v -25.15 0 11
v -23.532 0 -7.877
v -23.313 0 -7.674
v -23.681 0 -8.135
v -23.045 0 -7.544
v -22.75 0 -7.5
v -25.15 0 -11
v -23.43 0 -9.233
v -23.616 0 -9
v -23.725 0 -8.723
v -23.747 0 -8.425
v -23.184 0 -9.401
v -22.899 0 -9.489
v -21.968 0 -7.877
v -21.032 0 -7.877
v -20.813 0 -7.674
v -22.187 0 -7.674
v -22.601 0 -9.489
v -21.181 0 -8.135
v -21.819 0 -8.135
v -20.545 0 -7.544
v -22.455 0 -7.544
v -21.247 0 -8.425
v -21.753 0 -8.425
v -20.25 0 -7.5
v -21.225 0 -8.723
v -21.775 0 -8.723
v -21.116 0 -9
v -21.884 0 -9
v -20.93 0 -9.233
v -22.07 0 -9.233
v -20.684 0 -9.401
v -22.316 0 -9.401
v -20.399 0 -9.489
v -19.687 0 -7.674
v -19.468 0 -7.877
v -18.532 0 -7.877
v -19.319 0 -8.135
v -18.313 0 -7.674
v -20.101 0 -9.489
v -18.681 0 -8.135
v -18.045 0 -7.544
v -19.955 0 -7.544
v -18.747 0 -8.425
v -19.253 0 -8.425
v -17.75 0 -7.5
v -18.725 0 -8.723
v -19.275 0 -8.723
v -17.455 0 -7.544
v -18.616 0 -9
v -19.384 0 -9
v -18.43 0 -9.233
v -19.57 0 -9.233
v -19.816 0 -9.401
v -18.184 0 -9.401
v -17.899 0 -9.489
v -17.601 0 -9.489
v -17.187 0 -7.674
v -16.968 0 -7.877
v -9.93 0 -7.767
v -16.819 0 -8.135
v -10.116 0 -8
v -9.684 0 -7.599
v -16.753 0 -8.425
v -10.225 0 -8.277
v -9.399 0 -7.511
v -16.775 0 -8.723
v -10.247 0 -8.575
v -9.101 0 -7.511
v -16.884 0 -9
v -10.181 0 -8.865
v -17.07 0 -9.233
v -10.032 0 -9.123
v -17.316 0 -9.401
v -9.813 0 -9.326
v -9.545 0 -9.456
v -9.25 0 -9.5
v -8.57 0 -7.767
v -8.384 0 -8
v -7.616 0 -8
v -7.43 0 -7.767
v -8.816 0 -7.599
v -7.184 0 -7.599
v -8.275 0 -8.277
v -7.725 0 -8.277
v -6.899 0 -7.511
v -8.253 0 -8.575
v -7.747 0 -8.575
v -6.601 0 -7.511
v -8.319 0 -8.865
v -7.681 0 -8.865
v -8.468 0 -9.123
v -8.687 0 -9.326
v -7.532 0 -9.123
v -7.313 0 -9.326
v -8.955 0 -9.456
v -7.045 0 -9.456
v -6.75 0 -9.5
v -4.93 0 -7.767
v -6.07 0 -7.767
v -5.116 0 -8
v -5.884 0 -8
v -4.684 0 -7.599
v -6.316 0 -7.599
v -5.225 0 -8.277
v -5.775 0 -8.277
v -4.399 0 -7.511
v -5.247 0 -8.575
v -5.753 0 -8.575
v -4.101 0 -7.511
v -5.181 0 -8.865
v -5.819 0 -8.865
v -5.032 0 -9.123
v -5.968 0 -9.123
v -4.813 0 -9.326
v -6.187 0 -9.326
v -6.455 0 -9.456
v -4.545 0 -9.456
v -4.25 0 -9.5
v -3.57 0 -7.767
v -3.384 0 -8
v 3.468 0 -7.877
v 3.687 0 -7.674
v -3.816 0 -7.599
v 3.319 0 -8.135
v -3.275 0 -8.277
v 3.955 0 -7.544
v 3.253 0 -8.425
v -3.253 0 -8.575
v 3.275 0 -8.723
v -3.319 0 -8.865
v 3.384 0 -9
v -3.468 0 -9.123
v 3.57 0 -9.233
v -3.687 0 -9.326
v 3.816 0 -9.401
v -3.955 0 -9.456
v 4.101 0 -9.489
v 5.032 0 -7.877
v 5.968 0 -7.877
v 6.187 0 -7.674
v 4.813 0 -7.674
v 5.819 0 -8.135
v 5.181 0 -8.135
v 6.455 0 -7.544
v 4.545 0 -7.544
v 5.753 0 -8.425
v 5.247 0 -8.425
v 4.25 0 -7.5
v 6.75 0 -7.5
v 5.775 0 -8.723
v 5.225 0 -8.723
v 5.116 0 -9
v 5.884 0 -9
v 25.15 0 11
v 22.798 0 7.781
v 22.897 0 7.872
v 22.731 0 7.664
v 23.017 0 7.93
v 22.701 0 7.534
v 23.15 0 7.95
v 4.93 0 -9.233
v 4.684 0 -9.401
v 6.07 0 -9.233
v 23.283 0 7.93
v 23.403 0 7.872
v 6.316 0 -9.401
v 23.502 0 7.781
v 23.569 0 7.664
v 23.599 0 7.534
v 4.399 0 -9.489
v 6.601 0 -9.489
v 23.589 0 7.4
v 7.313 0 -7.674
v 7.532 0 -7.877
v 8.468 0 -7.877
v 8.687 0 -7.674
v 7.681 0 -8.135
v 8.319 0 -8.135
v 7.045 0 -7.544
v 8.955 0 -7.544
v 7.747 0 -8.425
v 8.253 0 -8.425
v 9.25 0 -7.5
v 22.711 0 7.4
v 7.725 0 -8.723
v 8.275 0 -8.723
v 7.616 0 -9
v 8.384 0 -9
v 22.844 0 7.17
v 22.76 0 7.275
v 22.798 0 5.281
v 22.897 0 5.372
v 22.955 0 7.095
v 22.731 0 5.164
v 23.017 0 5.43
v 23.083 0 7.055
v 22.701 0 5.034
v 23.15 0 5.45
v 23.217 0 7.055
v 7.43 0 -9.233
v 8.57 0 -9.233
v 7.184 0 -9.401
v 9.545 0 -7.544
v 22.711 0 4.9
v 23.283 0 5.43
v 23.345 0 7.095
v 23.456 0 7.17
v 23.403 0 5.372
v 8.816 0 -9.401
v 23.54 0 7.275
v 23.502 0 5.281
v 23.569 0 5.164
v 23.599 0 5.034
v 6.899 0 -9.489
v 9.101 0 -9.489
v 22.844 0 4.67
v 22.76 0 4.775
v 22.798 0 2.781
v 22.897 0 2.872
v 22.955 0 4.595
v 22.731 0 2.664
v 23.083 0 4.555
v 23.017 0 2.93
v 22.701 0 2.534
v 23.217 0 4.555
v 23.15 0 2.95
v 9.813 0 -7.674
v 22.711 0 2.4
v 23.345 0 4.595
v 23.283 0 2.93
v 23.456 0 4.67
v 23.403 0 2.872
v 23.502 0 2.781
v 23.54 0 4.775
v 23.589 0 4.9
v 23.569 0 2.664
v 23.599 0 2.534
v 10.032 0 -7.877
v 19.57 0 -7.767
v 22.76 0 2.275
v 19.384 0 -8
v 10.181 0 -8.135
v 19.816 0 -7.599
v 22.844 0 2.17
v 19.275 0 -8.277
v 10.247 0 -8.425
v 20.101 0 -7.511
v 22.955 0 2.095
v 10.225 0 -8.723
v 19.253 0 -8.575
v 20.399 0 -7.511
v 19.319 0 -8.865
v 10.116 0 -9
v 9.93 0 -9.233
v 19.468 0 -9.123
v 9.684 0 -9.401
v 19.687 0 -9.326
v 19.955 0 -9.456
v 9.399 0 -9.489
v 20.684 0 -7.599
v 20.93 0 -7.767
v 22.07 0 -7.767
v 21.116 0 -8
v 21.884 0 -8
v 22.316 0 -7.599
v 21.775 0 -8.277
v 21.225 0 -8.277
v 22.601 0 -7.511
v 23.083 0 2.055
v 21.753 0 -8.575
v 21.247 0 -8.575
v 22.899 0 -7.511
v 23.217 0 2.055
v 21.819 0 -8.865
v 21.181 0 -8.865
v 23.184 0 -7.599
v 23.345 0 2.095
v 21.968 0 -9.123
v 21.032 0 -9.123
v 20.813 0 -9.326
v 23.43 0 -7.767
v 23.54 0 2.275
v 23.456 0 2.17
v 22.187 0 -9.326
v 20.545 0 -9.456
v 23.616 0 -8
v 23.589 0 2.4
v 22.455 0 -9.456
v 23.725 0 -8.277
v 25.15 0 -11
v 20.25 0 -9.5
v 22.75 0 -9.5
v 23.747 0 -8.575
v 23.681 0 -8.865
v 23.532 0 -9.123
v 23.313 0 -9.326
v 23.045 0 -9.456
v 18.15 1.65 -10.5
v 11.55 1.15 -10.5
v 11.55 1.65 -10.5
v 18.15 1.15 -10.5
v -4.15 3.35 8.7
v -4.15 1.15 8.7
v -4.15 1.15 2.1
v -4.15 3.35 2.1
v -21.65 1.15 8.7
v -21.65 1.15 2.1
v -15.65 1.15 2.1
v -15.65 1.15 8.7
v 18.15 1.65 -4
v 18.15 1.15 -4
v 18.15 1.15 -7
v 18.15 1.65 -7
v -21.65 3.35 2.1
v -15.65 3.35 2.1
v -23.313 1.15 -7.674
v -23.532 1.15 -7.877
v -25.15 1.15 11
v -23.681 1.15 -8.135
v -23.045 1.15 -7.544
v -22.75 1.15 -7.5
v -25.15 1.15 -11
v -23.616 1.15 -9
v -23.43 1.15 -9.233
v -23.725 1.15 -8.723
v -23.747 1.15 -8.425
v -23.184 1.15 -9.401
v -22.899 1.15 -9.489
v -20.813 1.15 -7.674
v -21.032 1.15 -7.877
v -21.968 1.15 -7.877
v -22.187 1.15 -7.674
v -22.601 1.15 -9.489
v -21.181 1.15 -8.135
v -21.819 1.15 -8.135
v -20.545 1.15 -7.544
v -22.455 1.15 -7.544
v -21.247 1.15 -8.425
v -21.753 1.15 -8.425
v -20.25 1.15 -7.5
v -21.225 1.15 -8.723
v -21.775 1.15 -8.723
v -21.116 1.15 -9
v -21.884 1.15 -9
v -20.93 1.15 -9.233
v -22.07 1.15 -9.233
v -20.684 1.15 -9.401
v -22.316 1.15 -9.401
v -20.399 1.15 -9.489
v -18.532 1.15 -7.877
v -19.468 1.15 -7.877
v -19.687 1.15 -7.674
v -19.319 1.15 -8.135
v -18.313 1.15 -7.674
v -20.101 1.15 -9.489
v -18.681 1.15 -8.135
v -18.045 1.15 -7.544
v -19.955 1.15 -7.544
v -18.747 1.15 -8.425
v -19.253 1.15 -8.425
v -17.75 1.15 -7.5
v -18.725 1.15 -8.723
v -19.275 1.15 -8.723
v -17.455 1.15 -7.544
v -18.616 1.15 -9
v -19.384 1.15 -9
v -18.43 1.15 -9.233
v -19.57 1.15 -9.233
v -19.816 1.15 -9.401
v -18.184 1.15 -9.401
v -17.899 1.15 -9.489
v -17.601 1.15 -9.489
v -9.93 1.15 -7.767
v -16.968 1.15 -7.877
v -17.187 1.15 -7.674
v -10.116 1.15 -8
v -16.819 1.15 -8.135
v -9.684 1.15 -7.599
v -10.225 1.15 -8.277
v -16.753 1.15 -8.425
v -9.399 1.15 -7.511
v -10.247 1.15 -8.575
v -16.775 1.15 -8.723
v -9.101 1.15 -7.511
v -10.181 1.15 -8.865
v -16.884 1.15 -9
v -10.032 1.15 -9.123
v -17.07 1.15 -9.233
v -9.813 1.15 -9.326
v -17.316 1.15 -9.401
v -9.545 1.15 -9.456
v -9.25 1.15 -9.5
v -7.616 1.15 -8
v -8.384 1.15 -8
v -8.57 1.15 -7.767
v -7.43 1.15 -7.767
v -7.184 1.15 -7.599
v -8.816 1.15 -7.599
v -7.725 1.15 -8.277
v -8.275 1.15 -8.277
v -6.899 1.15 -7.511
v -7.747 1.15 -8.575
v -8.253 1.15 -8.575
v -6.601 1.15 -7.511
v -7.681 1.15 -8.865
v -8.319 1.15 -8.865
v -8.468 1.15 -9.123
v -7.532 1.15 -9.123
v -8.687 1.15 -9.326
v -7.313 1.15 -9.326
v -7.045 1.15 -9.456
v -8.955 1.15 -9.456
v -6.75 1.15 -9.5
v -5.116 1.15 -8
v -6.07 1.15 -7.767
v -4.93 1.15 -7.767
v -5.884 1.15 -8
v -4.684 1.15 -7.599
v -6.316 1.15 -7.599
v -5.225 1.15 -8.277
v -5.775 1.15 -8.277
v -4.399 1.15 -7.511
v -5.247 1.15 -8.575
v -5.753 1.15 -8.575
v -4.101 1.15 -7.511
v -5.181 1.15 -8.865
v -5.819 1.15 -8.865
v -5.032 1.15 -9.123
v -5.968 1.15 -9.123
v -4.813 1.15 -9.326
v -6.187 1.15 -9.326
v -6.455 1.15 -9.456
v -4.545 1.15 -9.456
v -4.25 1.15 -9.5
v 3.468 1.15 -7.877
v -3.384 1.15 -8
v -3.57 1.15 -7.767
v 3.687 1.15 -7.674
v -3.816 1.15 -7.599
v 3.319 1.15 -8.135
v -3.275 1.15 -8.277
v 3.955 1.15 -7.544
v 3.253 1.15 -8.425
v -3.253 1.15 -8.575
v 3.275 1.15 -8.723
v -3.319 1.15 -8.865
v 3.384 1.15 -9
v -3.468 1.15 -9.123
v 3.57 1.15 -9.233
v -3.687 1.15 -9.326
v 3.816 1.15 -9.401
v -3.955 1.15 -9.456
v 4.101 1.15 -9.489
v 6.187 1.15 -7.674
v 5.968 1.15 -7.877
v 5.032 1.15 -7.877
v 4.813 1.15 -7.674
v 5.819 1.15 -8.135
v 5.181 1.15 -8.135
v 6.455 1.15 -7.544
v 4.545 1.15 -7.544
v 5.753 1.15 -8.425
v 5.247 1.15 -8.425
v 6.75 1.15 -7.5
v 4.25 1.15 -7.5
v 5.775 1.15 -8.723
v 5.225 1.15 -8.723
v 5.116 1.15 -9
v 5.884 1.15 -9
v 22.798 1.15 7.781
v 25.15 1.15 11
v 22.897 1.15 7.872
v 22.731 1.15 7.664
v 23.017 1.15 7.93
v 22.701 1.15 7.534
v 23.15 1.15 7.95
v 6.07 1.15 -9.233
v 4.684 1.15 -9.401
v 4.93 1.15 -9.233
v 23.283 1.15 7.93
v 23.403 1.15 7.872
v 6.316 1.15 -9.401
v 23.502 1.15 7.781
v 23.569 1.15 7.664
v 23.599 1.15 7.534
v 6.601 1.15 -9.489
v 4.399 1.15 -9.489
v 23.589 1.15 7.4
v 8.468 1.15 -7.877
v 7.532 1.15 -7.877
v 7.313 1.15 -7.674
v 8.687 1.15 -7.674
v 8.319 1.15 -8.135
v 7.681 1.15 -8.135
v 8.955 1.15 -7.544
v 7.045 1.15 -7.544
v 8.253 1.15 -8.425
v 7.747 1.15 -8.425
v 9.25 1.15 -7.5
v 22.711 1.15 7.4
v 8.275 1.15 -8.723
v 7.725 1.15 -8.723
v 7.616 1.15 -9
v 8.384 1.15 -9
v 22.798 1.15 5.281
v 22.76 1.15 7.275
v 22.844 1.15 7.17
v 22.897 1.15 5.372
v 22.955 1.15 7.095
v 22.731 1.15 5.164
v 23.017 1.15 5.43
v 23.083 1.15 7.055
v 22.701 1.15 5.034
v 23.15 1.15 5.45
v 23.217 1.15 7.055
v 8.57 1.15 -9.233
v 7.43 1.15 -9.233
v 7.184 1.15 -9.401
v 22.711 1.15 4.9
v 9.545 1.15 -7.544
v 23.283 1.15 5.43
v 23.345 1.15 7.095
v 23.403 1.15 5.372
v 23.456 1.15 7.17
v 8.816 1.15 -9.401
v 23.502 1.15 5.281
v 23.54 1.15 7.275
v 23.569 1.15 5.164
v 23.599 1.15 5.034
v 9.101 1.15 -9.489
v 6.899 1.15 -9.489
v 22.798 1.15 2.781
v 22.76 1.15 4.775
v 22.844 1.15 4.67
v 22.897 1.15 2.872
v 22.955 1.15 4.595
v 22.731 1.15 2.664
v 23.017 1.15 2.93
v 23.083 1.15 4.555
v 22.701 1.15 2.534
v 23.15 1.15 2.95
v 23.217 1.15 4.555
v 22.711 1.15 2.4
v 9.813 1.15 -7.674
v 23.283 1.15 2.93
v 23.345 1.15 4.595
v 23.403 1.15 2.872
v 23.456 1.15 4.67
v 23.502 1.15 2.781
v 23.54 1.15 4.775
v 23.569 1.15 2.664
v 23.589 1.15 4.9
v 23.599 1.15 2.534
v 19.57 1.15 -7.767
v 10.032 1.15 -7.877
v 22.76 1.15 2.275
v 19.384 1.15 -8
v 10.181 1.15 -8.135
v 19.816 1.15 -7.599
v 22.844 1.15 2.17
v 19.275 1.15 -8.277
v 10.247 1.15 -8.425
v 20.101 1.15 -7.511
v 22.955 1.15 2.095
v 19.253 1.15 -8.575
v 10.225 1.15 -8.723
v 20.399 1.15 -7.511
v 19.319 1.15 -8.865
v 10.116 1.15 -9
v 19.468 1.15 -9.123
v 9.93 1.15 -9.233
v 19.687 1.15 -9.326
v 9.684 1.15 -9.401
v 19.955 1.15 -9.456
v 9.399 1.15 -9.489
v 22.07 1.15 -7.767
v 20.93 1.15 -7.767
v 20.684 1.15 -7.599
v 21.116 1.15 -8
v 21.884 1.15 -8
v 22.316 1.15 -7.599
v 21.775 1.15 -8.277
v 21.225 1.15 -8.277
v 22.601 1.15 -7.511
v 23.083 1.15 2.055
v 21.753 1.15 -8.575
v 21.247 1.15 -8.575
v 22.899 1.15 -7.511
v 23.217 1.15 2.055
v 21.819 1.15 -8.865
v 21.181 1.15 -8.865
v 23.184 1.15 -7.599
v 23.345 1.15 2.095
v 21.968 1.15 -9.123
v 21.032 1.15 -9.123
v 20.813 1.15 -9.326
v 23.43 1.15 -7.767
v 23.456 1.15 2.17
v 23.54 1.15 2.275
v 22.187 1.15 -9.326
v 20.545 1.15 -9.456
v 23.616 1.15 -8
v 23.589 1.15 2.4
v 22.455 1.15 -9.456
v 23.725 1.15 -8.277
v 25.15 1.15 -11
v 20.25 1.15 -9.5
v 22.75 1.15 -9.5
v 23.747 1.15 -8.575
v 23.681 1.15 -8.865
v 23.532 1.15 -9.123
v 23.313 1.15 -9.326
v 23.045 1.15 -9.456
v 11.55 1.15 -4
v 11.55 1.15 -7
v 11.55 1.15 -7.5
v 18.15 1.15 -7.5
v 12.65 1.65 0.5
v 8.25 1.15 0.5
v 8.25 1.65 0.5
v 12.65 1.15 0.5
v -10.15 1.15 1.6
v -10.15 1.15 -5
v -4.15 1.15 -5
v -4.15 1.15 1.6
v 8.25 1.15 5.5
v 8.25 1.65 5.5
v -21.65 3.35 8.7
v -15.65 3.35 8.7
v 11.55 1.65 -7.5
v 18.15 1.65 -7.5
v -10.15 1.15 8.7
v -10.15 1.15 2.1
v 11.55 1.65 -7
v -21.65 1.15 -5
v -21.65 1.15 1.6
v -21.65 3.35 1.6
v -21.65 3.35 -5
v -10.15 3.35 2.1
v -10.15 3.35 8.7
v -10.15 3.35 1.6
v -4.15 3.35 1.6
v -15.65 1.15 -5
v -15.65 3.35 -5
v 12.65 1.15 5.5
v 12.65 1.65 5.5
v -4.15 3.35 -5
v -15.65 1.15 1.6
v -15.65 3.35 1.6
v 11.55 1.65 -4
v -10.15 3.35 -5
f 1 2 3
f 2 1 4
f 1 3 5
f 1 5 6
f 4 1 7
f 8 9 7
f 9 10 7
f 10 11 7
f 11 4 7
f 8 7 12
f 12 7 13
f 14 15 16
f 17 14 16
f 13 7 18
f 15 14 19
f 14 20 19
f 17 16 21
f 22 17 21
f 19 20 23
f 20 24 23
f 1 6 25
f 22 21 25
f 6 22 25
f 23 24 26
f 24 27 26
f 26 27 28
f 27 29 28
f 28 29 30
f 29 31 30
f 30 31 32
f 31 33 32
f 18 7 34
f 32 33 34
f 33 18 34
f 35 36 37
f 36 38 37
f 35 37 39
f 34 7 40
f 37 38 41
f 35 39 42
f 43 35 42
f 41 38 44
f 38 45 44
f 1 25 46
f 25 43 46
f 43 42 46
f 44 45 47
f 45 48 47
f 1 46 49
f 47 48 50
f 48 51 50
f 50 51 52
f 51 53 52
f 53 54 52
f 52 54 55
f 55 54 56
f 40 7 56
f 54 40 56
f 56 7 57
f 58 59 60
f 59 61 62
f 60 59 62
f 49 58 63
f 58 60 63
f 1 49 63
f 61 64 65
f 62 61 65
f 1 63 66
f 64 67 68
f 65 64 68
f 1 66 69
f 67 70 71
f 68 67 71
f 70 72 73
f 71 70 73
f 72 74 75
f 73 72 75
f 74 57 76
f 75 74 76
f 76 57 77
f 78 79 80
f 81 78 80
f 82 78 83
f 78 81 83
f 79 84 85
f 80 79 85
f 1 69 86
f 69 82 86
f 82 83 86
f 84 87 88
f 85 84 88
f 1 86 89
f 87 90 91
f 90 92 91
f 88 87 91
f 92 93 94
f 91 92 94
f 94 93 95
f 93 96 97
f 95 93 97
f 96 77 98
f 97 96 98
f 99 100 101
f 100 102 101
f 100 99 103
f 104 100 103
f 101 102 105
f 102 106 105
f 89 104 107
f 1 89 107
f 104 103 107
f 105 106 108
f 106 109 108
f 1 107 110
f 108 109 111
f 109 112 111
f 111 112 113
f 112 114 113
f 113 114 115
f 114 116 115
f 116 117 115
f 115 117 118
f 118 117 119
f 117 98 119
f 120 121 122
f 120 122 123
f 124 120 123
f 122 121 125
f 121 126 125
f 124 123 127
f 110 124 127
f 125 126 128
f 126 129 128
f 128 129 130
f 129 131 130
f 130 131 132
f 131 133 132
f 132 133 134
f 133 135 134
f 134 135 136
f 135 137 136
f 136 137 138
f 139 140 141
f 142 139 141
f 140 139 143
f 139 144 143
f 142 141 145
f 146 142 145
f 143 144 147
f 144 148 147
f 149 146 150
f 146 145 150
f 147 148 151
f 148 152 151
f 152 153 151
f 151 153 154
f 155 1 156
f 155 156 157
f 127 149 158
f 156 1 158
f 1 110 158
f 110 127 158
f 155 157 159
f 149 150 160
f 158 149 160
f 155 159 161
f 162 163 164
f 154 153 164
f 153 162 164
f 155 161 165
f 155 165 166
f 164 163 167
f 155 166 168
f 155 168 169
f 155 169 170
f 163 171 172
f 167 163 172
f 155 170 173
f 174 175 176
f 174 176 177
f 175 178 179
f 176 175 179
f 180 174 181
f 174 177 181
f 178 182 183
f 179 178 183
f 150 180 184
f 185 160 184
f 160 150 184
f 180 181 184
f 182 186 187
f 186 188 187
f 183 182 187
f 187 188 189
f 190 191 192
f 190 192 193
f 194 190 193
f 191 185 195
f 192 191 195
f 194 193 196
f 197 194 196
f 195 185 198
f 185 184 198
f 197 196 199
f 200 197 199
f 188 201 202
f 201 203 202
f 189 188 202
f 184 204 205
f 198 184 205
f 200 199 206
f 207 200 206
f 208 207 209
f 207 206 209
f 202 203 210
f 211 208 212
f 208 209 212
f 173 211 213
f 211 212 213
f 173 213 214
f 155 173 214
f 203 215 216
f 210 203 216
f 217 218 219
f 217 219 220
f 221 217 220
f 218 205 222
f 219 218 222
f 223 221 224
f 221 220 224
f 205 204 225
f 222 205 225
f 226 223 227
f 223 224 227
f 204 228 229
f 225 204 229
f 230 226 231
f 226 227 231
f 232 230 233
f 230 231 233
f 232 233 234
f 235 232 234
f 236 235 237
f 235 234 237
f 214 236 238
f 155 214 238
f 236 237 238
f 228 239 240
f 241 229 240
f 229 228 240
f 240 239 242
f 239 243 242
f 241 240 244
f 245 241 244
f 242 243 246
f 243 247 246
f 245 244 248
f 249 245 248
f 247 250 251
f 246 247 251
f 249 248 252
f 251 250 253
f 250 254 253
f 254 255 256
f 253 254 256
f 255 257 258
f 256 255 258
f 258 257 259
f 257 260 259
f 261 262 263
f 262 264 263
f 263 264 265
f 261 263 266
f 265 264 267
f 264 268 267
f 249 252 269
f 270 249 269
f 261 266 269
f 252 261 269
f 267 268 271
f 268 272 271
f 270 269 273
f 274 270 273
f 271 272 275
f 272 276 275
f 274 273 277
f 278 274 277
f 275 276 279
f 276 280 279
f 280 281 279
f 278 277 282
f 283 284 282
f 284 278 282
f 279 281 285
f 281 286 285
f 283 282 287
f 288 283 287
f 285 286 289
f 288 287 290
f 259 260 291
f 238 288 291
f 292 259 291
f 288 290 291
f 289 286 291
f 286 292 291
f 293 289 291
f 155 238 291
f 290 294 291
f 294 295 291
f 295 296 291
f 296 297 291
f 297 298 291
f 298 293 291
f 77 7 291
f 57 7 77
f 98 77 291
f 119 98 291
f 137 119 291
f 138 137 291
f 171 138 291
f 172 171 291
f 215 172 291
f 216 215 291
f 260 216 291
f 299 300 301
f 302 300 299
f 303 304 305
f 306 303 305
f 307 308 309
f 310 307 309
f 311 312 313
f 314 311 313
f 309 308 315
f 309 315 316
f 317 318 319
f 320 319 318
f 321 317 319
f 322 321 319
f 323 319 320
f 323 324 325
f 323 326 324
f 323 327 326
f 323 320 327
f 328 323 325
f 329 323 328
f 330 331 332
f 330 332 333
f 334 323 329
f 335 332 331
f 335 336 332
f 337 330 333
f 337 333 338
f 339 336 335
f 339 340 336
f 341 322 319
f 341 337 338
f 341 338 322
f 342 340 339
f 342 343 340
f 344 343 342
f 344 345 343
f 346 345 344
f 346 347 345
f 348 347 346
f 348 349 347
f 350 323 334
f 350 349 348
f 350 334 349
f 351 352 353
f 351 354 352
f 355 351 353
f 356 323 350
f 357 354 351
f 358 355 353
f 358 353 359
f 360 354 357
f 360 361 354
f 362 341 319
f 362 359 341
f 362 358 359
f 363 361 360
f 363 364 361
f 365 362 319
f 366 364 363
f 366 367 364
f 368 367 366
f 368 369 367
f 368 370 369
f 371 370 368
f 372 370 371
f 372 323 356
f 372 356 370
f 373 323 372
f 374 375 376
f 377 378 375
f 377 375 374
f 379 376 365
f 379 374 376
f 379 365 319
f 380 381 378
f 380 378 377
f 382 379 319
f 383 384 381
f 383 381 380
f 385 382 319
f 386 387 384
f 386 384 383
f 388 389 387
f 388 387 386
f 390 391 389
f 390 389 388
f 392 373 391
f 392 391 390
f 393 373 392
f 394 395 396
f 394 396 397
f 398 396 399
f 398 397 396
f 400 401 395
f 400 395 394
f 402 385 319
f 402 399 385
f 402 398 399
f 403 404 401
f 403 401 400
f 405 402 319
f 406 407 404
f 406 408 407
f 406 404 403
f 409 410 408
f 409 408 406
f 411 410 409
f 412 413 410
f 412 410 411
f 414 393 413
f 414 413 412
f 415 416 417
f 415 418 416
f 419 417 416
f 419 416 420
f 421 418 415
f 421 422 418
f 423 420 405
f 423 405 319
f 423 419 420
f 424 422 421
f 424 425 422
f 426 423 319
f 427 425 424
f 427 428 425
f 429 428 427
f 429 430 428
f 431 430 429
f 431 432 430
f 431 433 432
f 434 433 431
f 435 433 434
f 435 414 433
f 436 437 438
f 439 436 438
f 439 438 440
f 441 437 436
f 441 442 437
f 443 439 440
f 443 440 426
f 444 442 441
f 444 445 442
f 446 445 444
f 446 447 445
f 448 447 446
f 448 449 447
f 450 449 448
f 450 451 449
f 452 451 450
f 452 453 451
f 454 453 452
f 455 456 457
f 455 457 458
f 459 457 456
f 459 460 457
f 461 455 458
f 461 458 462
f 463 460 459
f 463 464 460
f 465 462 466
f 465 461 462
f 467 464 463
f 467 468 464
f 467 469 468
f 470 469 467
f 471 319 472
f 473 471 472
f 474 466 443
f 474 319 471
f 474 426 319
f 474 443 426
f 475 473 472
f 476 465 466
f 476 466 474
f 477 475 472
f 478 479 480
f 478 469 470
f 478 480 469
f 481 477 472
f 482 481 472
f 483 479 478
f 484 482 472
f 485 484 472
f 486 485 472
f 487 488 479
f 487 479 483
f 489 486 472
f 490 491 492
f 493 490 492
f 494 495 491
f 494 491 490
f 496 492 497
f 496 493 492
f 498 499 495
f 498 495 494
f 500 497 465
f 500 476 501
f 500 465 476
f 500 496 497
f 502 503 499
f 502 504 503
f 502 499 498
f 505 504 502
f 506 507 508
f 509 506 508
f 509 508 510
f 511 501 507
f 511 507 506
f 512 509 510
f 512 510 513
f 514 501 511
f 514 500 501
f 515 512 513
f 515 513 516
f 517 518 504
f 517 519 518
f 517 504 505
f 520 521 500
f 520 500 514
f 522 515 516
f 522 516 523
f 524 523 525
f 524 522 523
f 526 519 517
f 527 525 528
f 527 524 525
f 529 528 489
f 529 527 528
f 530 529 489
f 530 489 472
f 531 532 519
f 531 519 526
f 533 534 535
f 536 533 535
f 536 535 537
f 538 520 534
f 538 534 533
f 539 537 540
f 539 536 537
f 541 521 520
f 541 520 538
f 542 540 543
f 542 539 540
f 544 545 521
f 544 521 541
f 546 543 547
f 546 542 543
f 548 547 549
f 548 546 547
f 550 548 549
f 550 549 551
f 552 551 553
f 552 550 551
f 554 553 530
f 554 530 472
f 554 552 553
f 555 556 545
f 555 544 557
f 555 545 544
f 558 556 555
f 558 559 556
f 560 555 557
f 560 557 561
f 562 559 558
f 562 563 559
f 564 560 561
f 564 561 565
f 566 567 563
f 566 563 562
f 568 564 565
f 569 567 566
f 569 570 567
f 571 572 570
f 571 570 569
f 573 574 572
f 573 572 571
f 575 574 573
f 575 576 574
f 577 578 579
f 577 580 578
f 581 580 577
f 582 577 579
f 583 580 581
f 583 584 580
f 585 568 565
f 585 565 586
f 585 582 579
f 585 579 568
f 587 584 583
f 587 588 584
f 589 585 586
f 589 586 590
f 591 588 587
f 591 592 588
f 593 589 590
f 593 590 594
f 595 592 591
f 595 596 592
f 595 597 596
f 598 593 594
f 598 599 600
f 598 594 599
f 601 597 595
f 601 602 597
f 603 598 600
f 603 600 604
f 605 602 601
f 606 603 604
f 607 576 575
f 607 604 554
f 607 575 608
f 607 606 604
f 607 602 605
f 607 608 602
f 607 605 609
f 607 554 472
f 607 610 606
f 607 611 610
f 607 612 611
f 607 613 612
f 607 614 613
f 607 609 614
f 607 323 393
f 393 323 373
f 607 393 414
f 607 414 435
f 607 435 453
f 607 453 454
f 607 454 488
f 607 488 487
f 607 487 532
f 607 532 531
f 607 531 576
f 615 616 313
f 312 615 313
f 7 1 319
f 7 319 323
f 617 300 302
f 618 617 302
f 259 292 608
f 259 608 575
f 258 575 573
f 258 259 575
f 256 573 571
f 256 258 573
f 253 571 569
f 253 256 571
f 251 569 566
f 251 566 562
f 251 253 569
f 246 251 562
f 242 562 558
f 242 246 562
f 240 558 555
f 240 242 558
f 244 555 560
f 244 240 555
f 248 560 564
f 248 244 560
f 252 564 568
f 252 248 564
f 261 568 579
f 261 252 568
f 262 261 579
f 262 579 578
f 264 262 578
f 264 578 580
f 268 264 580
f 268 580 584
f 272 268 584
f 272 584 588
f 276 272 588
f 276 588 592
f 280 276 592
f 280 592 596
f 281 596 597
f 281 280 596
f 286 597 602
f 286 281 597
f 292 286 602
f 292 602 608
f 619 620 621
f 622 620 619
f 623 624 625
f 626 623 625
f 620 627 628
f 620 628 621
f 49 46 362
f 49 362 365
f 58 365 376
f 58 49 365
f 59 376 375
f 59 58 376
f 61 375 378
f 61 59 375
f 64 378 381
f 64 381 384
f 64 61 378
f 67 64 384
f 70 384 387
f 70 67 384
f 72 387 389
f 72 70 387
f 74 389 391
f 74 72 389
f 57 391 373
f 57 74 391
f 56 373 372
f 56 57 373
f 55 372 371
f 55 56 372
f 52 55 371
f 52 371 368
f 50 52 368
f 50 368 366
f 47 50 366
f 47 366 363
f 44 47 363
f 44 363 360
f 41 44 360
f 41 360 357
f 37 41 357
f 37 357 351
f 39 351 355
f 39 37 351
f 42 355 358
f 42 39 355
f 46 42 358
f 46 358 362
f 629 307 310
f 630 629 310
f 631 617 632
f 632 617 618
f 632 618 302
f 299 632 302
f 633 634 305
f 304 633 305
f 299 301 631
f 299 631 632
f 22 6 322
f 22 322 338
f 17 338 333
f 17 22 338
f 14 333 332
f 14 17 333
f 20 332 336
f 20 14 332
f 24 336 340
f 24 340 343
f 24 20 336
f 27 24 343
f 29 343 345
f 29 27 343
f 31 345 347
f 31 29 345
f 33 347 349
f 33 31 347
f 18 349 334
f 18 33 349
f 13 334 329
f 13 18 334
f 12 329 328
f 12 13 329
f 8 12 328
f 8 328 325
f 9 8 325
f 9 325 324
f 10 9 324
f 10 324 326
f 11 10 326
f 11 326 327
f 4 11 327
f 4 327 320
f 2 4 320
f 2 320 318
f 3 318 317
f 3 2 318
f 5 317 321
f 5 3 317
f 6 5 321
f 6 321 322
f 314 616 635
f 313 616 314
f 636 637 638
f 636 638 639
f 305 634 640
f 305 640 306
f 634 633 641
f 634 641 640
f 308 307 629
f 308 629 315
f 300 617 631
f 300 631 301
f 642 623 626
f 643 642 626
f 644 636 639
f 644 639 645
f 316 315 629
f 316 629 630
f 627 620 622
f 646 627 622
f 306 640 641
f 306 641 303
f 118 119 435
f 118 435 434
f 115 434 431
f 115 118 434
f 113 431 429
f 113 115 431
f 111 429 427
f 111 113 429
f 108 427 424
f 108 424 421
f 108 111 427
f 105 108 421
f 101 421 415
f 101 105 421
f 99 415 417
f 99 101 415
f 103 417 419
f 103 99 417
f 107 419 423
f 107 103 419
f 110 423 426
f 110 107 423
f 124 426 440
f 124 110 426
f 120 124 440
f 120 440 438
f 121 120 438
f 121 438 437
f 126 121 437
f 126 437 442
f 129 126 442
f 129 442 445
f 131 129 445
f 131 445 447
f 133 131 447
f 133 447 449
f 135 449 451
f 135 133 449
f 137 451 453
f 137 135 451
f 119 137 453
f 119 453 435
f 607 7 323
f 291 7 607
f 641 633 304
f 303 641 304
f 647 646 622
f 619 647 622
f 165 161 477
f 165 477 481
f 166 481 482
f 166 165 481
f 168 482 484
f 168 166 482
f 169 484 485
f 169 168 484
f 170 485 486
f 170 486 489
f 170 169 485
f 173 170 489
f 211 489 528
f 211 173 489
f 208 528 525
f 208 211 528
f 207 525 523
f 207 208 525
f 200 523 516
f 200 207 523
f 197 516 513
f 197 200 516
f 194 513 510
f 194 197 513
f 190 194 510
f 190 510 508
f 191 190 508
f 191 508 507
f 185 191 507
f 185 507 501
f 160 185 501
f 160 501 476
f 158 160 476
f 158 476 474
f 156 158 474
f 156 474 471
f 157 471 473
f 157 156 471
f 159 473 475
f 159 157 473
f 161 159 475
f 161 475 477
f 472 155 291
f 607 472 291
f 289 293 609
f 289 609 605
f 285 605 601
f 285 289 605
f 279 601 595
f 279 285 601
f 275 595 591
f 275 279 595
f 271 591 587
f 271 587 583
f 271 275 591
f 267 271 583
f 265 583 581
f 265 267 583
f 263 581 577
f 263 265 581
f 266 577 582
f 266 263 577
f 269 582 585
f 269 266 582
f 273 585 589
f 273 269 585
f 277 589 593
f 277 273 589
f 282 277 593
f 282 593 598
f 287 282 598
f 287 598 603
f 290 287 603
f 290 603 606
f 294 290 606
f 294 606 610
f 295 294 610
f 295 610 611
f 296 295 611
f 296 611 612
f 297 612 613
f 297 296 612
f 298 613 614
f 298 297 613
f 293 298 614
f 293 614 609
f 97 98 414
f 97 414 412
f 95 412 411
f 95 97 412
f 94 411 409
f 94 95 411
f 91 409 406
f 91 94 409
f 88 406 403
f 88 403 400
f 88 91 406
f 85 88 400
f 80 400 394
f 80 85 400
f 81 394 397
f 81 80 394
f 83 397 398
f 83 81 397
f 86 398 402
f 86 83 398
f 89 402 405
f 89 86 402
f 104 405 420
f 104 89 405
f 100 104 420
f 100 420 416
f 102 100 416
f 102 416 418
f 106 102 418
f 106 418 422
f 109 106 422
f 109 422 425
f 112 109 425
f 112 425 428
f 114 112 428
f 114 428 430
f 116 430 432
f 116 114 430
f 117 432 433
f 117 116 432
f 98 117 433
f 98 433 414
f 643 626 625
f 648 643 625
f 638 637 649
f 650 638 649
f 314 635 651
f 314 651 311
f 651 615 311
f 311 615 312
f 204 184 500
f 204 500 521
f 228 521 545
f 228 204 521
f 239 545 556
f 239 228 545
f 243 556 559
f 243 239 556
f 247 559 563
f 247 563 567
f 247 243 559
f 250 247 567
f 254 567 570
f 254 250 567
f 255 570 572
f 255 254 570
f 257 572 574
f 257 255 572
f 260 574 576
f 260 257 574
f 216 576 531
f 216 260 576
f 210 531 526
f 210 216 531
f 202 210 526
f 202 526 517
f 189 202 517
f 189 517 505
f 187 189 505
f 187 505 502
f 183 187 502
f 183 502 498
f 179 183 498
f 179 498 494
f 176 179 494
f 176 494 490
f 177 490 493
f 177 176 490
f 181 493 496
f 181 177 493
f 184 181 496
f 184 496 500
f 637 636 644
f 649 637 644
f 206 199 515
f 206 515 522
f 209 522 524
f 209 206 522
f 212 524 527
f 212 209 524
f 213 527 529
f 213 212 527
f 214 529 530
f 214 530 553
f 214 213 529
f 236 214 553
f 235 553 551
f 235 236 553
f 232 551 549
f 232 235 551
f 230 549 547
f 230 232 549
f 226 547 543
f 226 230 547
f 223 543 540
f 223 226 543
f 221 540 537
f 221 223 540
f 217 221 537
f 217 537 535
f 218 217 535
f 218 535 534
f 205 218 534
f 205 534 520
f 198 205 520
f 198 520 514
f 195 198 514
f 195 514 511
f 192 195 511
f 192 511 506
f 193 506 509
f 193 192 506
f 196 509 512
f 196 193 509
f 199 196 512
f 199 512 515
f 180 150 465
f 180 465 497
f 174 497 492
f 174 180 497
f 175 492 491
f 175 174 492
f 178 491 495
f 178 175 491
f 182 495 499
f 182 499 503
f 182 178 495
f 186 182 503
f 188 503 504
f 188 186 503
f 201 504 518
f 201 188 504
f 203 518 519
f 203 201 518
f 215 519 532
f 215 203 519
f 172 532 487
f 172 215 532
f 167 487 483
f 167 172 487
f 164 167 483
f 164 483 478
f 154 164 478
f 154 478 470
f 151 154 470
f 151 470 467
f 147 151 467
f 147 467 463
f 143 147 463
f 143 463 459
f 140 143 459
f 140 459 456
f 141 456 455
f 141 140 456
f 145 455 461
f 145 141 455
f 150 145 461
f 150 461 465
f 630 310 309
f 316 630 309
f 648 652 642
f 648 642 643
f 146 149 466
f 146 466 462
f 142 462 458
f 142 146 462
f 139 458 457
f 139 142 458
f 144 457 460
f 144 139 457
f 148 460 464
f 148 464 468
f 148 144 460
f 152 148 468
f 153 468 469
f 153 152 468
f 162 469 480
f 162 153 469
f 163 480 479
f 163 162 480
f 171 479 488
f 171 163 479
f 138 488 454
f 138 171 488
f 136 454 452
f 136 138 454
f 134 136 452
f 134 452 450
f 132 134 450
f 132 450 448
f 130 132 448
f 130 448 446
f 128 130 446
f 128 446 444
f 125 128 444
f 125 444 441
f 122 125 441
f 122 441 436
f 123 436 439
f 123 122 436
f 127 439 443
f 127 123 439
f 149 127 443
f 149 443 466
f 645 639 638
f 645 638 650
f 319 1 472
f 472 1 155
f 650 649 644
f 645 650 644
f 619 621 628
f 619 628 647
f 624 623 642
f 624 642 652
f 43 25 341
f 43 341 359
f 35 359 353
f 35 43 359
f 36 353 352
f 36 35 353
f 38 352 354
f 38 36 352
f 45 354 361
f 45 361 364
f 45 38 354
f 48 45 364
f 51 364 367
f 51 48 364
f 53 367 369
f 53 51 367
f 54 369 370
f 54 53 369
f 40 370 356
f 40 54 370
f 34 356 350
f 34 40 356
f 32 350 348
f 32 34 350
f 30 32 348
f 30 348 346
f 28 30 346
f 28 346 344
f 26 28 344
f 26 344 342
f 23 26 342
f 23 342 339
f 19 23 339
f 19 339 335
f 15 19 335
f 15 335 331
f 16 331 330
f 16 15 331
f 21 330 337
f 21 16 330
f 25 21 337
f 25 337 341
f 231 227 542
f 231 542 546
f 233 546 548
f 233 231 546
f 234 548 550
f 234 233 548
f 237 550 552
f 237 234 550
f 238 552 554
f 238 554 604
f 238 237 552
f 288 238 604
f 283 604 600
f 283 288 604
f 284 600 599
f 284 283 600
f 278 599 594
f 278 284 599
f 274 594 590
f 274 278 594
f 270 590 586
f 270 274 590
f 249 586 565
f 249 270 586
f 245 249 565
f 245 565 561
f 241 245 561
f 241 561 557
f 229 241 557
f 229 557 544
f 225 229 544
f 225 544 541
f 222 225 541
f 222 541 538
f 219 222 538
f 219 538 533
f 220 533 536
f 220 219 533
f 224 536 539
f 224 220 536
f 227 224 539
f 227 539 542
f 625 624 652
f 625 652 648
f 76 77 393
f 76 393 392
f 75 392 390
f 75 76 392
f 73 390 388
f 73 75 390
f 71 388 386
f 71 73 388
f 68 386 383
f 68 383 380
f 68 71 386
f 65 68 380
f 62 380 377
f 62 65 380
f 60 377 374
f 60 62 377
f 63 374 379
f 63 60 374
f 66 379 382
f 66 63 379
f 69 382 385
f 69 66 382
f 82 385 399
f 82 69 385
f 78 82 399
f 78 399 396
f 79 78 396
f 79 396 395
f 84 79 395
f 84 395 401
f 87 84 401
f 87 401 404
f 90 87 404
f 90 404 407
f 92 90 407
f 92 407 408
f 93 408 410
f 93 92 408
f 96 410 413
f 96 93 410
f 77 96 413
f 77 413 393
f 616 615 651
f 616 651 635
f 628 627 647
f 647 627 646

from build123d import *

# Parameters (mm, degrees)
CROQUIS1_W                = 50.3
CROQUIS1_H                = 22
CROQUIS1_R                = 0.45
CROQUIS1_R_2              = 1
SALIENTE_EXTRUIR1_DEPTH   = 1.15
CROQUIS2_W                = 6
CROQUIS2_H                = 6.6
SALIENTE_EXTRUIR2_DEPTH   = 2.2
SALIENTE_EXTRUIR2_2_DEPTH = 2.2
SALIENTE_EXTRUIR2_3_DEPTH = 2.2
SALIENTE_EXTRUIR2_4_DEPTH = 2.2
CROQUIS3_W                = 4.4
CROQUIS3_H                = 5
SALIENTE_EXTRUIR3_DEPTH   = 0.5
CROQUIS3_W_2              = 6.6
CROQUIS3_H_2              = 3
SALIENTE_EXTRUIR3_2_DEPTH = 0.5
SALIENTE_EXTRUIR3_3_DEPTH = 0.5


with BuildPart() as part:
    # Croquis1 → Saliente-Extruir1 (new body)
    with BuildSketch(Plane(origin=(0, 0, 0), x_dir=(1, 0, 0), z_dir=(0, 1, 0))):
        Rectangle(CROQUIS1_W, CROQUIS1_H)
        with Locations(Location((23.15, -7.5, 0), (0, 0, 270))):
            Circle(CROQUIS1_R, mode=Mode.SUBTRACT)
        with Locations(Location((23.15, -5, 0), (0, 0, 270))):
            Circle(CROQUIS1_R, mode=Mode.SUBTRACT)
        with Locations(Location((23.15, -2.5, 0), (0, 0, 270))):
            Circle(CROQUIS1_R, mode=Mode.SUBTRACT)
        with Locations(Location((4.25, 8.5, 0), (0, 0, 270))):
            Circle(CROQUIS1_R_2, mode=Mode.SUBTRACT)
        with Locations(Location((6.75, 8.5, 0), (0, 0, 270))):
            Circle(CROQUIS1_R_2, mode=Mode.SUBTRACT)
        with Locations(Location((9.25, 8.5, 0), (0, 0, 270))):
            Circle(CROQUIS1_R_2, mode=Mode.SUBTRACT)
        with Locations(Location((-9.25, 8.5, 0), (0, 0, 90))):
            Circle(CROQUIS1_R_2, mode=Mode.SUBTRACT)
        with Locations(Location((-6.75, 8.5, 0), (0, 0, 90))):
            Circle(CROQUIS1_R_2, mode=Mode.SUBTRACT)
        with Locations(Location((-4.25, 8.5, 0), (0, 0, 90))):
            Circle(CROQUIS1_R_2, mode=Mode.SUBTRACT)
        with Locations(Location((-22.75, 8.5, 0), (0, 0, 270))):
            Circle(CROQUIS1_R_2, mode=Mode.SUBTRACT)
        with Locations(Location((-20.25, 8.5, 0), (0, 0, 270))):
            Circle(CROQUIS1_R_2, mode=Mode.SUBTRACT)
        with Locations(Location((-17.75, 8.5, 0), (0, 0, 270))):
            Circle(CROQUIS1_R_2, mode=Mode.SUBTRACT)
        with Locations(Location((22.75, 8.5, 0), (0, 0, 90))):
            Circle(CROQUIS1_R_2, mode=Mode.SUBTRACT)
        with Locations(Location((20.25, 8.5, 0), (0, 0, 90))):
            Circle(CROQUIS1_R_2, mode=Mode.SUBTRACT)
    extrude(amount=SALIENTE_EXTRUIR1_DEPTH)


with BuildPart() as body_2:
    # Croquis2 → Saliente-Extruir2 (new body)
    with BuildSketch(Plane(origin=(0, 1.15, 0), x_dir=(1, 0, 0), z_dir=(0, 1, 0))):
        with Locations((-18.65, 1.7)):
            Rectangle(CROQUIS2_W, CROQUIS2_H)
    extrude(amount=SALIENTE_EXTRUIR2_DEPTH)


with BuildPart() as body_3:
    # Croquis2 → Saliente-Extruir2 2 (new body)
    with BuildSketch(Plane(origin=(0, 1.15, 0), x_dir=(1, 0, 0), z_dir=(0, 1, 0))):
        with Locations((-7.15, 1.7)):
            Rectangle(CROQUIS2_W, CROQUIS2_H)
    extrude(amount=SALIENTE_EXTRUIR2_2_DEPTH)


with BuildPart() as body_4:
    # Croquis2 → Saliente-Extruir2 3 (new body)
    with BuildSketch(Plane(origin=(0, 1.15, 0), x_dir=(1, 0, 0), z_dir=(0, 1, 0))):
        with Locations((-7.15, -5.4)):
            Rectangle(CROQUIS2_W, CROQUIS2_H)
    extrude(amount=SALIENTE_EXTRUIR2_3_DEPTH)


with BuildPart() as body_5:
    # Croquis2 → Saliente-Extruir2 4 (new body)
    with BuildSketch(Plane(origin=(0, 1.15, 0), x_dir=(1, 0, 0), z_dir=(0, 1, 0))):
        with Locations((-18.65, -5.4)):
            Rectangle(CROQUIS2_W, CROQUIS2_H)
    extrude(amount=SALIENTE_EXTRUIR2_4_DEPTH)


with BuildPart() as body_6:
    # Croquis3 → Saliente-Extruir3 (new body)
    with BuildSketch(Plane(origin=(0, 1.15, 0), x_dir=(1, 0, 0), z_dir=(0, 1, 0))):
        with Locations((10.45, -3)):
            Rectangle(CROQUIS3_W, CROQUIS3_H)
    extrude(amount=SALIENTE_EXTRUIR3_DEPTH)


with BuildPart() as body_7:
    # Croquis3 → Saliente-Extruir3 2 (new body)
    with BuildSketch(Plane(origin=(0, 1.15, 0), x_dir=(1, 0, 0), z_dir=(0, 1, 0))):
        with Locations((14.85, 9)):
            Rectangle(CROQUIS3_W_2, CROQUIS3_H_2)
    extrude(amount=SALIENTE_EXTRUIR3_2_DEPTH)


with BuildPart() as body_8:
    # Croquis3 → Saliente-Extruir3 3 (new body)
    with BuildSketch(Plane(origin=(0, 1.15, 0), x_dir=(1, 0, 0), z_dir=(0, 1, 0))):
        with Locations((14.85, 5.5)):
            Rectangle(CROQUIS3_W_2, CROQUIS3_H_2)
    extrude(amount=SALIENTE_EXTRUIR3_3_DEPTH)


solid = Compound([part.part, body_2.part, body_3.part, body_4.part, body_5.part, body_6.part, body_7.part, body_8.part])
